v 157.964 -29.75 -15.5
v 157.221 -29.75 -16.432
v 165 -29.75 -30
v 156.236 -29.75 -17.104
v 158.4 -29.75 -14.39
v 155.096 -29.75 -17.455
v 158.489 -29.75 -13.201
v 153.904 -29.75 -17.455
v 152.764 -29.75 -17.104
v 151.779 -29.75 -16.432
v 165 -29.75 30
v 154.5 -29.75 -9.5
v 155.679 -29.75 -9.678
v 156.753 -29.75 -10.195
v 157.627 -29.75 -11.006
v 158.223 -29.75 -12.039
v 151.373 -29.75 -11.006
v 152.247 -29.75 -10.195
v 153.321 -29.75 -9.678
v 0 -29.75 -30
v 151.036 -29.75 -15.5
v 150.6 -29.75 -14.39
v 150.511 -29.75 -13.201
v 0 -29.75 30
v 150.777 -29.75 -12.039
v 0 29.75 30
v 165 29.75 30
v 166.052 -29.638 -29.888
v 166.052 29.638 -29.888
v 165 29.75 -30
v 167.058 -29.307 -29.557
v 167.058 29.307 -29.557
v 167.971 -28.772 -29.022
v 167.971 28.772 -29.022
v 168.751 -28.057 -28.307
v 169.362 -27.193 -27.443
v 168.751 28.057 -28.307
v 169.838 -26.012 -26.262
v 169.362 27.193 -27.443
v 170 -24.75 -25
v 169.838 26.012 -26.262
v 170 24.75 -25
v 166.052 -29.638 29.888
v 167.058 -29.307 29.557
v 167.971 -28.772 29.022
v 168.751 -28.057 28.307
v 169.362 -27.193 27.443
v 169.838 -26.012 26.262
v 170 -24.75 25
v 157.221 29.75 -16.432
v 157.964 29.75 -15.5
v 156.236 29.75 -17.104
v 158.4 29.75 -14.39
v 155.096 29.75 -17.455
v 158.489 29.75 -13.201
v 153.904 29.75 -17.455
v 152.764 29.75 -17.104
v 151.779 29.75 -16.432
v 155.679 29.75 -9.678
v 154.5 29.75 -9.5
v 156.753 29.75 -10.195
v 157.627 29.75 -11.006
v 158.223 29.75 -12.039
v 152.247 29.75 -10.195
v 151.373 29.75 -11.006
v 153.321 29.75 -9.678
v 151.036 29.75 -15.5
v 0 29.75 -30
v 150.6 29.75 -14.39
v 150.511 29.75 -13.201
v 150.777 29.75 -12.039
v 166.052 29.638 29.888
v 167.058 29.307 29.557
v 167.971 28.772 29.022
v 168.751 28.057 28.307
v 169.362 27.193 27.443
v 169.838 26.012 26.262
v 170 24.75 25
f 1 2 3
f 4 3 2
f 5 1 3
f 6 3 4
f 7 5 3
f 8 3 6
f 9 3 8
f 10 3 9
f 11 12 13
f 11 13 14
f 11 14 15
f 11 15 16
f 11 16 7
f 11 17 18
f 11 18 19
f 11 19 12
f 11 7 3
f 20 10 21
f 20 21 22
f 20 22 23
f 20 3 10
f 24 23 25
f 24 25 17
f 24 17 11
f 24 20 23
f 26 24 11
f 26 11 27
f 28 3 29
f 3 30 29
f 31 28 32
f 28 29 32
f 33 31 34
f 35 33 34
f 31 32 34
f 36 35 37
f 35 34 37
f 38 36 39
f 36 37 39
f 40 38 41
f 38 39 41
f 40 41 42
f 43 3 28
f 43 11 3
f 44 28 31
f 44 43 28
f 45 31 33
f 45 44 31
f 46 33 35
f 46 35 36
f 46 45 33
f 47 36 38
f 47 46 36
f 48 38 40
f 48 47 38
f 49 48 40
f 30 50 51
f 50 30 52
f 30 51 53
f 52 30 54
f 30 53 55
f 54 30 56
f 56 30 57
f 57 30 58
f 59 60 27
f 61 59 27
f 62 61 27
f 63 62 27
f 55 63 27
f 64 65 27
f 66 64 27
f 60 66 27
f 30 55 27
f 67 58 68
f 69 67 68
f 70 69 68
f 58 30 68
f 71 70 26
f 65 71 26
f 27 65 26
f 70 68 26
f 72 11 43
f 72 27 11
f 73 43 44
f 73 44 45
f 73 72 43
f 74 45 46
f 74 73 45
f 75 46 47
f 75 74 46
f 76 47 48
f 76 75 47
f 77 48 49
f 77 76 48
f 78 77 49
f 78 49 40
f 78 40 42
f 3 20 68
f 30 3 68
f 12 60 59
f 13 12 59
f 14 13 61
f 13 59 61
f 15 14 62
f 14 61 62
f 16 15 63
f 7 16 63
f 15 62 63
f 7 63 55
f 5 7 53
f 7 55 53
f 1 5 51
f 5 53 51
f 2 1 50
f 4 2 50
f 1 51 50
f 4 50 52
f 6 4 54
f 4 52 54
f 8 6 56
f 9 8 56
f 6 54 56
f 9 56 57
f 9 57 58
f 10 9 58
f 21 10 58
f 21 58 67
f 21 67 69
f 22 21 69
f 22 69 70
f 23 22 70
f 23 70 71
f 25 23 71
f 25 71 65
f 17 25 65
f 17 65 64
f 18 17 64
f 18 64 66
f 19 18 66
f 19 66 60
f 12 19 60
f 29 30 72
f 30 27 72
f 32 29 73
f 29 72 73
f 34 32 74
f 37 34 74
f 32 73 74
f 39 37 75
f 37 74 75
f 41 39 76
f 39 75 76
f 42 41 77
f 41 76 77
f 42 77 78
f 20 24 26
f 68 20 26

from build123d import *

# Parameters (mm, degrees)
SKETCH060_W     = 59.5
SKETCH060_H     = 60
PAD021_DEPTH    = 170
FILLET004_R     = 5
SKETCH061_R     = 4
POCKET038_DEPTH = 59.501


with BuildPart() as part:
    # Sketch060 → Pad021 (new body)
    with BuildSketch(Plane.YZ):
        Rectangle(SKETCH060_W, SKETCH060_H)
    extrude(amount=PAD021_DEPTH)

    # Fillet004
    fillet004_edges = [part.edges().sort_by_distance(p)[0] for p in [
        (170, 29.75, 0),
        (170, 0, 30),
        (170, 0, -30),
        (170, -29.75, 0),
    ]]
    fillet(fillet004_edges, radius=FILLET004_R)

    # Sketch061 (on Face5 of Fillet004) → Pocket038 (cut, through all)
    with BuildSketch(Plane.ZX.offset(29.75)):
        with Locations((-13.5, 154.5)):
            Circle(SKETCH061_R)
    extrude(amount=-POCKET038_DEPTH, mode=Mode.SUBTRACT)


solid = part.part
